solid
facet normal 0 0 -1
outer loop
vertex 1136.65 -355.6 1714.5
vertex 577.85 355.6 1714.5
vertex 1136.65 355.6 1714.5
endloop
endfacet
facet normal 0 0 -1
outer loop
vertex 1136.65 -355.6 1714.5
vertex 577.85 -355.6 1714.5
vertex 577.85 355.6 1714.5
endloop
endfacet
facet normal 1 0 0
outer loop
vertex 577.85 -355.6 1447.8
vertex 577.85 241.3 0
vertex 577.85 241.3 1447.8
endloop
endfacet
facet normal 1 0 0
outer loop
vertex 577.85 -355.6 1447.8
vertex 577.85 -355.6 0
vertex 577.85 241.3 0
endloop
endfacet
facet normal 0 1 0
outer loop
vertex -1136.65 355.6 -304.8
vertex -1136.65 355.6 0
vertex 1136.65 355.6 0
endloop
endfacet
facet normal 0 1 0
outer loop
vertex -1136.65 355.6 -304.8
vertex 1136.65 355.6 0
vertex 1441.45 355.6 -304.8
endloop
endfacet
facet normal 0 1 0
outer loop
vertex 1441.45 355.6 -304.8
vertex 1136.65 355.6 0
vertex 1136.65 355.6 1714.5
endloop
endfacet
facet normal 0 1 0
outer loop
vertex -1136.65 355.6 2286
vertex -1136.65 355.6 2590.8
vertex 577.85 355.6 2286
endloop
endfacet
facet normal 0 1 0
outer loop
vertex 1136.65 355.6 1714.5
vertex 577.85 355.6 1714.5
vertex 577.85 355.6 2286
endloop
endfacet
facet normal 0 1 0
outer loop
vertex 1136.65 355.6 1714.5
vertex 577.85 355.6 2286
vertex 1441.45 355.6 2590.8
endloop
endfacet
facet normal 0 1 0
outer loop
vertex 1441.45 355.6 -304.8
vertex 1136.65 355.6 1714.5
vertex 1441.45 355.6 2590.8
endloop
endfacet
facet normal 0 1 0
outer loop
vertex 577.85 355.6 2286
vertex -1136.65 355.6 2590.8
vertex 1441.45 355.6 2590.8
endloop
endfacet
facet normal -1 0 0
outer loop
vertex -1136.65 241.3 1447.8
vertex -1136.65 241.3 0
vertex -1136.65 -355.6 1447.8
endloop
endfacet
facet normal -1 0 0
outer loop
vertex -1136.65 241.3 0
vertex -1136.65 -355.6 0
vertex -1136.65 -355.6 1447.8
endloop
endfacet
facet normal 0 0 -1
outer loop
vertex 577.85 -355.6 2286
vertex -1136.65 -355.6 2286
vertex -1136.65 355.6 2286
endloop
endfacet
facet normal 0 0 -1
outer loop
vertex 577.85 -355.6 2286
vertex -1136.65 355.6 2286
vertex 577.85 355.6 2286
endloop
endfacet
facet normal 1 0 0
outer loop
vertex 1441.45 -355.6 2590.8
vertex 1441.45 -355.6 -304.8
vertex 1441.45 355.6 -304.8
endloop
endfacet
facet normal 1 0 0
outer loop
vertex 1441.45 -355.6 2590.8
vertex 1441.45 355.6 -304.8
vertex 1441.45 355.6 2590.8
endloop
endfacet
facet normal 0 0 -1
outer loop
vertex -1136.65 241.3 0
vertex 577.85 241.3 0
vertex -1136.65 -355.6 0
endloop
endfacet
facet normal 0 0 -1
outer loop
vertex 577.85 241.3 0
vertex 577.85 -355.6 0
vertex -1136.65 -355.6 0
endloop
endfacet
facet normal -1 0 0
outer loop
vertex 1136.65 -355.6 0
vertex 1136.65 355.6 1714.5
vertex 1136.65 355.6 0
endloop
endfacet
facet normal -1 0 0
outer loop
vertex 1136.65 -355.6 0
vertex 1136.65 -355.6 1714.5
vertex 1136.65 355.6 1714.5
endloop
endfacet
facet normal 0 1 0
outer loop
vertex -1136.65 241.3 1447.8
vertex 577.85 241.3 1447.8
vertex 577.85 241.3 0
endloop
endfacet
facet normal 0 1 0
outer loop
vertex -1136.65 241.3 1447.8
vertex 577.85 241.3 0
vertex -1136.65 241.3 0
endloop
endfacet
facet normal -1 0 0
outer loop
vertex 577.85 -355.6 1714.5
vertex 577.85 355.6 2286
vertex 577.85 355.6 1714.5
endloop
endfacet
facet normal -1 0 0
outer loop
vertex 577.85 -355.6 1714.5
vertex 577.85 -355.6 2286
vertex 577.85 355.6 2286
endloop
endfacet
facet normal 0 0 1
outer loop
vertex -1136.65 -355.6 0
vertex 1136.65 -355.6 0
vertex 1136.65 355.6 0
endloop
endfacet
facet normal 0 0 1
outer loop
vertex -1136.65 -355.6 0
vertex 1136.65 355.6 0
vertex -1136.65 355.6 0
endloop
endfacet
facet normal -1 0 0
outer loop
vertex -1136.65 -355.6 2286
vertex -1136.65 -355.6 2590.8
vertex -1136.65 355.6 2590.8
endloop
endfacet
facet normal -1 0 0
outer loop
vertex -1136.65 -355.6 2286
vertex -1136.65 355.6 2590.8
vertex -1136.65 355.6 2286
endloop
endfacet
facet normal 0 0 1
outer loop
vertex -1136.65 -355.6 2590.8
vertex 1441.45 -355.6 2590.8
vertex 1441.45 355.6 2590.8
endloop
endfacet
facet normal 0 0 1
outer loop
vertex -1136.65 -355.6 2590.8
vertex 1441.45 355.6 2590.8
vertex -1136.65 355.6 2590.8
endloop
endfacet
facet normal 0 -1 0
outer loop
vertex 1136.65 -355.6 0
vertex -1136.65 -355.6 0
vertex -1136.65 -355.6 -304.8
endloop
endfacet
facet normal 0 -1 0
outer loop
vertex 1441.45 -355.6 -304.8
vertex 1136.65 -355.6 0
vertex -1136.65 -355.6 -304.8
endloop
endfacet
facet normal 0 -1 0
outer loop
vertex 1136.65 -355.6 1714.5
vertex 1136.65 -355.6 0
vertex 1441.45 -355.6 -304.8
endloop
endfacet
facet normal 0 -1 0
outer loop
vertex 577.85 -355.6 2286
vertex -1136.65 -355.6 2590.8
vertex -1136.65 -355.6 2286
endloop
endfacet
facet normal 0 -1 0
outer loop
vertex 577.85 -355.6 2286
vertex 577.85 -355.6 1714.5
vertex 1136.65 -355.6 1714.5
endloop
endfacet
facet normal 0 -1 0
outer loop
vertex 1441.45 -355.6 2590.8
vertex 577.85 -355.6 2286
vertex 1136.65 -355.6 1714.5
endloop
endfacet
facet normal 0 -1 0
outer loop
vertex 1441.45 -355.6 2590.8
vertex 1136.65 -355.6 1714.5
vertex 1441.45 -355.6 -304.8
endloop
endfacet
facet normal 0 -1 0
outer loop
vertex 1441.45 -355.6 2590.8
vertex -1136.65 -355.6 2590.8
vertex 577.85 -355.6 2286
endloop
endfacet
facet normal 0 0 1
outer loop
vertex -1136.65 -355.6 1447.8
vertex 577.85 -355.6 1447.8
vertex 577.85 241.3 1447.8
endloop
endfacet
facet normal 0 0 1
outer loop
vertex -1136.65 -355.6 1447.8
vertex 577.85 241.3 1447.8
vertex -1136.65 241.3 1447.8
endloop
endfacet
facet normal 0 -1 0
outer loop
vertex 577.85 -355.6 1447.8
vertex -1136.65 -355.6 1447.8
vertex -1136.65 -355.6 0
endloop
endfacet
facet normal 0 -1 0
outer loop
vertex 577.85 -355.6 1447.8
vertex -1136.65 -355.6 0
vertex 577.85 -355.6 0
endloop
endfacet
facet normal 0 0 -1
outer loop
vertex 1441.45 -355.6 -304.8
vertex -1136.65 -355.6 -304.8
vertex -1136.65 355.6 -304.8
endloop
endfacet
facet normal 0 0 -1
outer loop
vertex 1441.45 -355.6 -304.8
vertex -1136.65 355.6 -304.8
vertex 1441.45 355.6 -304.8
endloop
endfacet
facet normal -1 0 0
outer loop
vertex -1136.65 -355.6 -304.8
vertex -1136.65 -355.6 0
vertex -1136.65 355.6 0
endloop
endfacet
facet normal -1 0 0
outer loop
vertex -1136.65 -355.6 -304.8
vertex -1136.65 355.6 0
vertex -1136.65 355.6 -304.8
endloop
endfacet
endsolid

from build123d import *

# Parameters (mm, degrees)
F1_DEPTH = 355.6
F2_W     = 1714.5
F2_H     = 1447.8
F3_DEPTH = 355.6
F4_W     = 1714.5
F4_H     = 1447.8
F5_DEPTH = 241.3


# Not quite as in the source:
# - a length typed as a fraction of an inch, garbled in the dataset ("3 / 203.2 mm" for 3/8 in), is restored


with BuildPart() as f1:
    # F0 (on Front) → F1 (new body, symmetric)
    with BuildSketch(Plane.XZ):
        Polygon((1136.65, 1714.5), (1136.65, 0), (-1136.65, 0), (-1136.65, -304.8), (1441.45, -304.8), (1441.45, 2590.8), (-1136.65, 2590.8), (-1136.65, 2286), (577.85, 2286), (577.85, 1714.5), align=None)
    extrude(amount=F1_DEPTH, both=True)


with BuildPart() as f3:
    # F2 (on Front) → F3 (new body)
    with BuildSketch(Plane.XZ):
        with Locations((-279.4, 723.9)):
            Rectangle(F2_W, F2_H)
    extrude(amount=F3_DEPTH)

    # F4 (on face) → F5 (join)
    with BuildSketch(Plane(origin=(0, 0, 0), x_dir=(-1, 0, 0), z_dir=(0, 1, 0))):
        with Locations((279.4, 723.9)):
            Rectangle(F4_W, F4_H)
    extrude(amount=F5_DEPTH)


solid = Compound([f1.part, f3.part])
